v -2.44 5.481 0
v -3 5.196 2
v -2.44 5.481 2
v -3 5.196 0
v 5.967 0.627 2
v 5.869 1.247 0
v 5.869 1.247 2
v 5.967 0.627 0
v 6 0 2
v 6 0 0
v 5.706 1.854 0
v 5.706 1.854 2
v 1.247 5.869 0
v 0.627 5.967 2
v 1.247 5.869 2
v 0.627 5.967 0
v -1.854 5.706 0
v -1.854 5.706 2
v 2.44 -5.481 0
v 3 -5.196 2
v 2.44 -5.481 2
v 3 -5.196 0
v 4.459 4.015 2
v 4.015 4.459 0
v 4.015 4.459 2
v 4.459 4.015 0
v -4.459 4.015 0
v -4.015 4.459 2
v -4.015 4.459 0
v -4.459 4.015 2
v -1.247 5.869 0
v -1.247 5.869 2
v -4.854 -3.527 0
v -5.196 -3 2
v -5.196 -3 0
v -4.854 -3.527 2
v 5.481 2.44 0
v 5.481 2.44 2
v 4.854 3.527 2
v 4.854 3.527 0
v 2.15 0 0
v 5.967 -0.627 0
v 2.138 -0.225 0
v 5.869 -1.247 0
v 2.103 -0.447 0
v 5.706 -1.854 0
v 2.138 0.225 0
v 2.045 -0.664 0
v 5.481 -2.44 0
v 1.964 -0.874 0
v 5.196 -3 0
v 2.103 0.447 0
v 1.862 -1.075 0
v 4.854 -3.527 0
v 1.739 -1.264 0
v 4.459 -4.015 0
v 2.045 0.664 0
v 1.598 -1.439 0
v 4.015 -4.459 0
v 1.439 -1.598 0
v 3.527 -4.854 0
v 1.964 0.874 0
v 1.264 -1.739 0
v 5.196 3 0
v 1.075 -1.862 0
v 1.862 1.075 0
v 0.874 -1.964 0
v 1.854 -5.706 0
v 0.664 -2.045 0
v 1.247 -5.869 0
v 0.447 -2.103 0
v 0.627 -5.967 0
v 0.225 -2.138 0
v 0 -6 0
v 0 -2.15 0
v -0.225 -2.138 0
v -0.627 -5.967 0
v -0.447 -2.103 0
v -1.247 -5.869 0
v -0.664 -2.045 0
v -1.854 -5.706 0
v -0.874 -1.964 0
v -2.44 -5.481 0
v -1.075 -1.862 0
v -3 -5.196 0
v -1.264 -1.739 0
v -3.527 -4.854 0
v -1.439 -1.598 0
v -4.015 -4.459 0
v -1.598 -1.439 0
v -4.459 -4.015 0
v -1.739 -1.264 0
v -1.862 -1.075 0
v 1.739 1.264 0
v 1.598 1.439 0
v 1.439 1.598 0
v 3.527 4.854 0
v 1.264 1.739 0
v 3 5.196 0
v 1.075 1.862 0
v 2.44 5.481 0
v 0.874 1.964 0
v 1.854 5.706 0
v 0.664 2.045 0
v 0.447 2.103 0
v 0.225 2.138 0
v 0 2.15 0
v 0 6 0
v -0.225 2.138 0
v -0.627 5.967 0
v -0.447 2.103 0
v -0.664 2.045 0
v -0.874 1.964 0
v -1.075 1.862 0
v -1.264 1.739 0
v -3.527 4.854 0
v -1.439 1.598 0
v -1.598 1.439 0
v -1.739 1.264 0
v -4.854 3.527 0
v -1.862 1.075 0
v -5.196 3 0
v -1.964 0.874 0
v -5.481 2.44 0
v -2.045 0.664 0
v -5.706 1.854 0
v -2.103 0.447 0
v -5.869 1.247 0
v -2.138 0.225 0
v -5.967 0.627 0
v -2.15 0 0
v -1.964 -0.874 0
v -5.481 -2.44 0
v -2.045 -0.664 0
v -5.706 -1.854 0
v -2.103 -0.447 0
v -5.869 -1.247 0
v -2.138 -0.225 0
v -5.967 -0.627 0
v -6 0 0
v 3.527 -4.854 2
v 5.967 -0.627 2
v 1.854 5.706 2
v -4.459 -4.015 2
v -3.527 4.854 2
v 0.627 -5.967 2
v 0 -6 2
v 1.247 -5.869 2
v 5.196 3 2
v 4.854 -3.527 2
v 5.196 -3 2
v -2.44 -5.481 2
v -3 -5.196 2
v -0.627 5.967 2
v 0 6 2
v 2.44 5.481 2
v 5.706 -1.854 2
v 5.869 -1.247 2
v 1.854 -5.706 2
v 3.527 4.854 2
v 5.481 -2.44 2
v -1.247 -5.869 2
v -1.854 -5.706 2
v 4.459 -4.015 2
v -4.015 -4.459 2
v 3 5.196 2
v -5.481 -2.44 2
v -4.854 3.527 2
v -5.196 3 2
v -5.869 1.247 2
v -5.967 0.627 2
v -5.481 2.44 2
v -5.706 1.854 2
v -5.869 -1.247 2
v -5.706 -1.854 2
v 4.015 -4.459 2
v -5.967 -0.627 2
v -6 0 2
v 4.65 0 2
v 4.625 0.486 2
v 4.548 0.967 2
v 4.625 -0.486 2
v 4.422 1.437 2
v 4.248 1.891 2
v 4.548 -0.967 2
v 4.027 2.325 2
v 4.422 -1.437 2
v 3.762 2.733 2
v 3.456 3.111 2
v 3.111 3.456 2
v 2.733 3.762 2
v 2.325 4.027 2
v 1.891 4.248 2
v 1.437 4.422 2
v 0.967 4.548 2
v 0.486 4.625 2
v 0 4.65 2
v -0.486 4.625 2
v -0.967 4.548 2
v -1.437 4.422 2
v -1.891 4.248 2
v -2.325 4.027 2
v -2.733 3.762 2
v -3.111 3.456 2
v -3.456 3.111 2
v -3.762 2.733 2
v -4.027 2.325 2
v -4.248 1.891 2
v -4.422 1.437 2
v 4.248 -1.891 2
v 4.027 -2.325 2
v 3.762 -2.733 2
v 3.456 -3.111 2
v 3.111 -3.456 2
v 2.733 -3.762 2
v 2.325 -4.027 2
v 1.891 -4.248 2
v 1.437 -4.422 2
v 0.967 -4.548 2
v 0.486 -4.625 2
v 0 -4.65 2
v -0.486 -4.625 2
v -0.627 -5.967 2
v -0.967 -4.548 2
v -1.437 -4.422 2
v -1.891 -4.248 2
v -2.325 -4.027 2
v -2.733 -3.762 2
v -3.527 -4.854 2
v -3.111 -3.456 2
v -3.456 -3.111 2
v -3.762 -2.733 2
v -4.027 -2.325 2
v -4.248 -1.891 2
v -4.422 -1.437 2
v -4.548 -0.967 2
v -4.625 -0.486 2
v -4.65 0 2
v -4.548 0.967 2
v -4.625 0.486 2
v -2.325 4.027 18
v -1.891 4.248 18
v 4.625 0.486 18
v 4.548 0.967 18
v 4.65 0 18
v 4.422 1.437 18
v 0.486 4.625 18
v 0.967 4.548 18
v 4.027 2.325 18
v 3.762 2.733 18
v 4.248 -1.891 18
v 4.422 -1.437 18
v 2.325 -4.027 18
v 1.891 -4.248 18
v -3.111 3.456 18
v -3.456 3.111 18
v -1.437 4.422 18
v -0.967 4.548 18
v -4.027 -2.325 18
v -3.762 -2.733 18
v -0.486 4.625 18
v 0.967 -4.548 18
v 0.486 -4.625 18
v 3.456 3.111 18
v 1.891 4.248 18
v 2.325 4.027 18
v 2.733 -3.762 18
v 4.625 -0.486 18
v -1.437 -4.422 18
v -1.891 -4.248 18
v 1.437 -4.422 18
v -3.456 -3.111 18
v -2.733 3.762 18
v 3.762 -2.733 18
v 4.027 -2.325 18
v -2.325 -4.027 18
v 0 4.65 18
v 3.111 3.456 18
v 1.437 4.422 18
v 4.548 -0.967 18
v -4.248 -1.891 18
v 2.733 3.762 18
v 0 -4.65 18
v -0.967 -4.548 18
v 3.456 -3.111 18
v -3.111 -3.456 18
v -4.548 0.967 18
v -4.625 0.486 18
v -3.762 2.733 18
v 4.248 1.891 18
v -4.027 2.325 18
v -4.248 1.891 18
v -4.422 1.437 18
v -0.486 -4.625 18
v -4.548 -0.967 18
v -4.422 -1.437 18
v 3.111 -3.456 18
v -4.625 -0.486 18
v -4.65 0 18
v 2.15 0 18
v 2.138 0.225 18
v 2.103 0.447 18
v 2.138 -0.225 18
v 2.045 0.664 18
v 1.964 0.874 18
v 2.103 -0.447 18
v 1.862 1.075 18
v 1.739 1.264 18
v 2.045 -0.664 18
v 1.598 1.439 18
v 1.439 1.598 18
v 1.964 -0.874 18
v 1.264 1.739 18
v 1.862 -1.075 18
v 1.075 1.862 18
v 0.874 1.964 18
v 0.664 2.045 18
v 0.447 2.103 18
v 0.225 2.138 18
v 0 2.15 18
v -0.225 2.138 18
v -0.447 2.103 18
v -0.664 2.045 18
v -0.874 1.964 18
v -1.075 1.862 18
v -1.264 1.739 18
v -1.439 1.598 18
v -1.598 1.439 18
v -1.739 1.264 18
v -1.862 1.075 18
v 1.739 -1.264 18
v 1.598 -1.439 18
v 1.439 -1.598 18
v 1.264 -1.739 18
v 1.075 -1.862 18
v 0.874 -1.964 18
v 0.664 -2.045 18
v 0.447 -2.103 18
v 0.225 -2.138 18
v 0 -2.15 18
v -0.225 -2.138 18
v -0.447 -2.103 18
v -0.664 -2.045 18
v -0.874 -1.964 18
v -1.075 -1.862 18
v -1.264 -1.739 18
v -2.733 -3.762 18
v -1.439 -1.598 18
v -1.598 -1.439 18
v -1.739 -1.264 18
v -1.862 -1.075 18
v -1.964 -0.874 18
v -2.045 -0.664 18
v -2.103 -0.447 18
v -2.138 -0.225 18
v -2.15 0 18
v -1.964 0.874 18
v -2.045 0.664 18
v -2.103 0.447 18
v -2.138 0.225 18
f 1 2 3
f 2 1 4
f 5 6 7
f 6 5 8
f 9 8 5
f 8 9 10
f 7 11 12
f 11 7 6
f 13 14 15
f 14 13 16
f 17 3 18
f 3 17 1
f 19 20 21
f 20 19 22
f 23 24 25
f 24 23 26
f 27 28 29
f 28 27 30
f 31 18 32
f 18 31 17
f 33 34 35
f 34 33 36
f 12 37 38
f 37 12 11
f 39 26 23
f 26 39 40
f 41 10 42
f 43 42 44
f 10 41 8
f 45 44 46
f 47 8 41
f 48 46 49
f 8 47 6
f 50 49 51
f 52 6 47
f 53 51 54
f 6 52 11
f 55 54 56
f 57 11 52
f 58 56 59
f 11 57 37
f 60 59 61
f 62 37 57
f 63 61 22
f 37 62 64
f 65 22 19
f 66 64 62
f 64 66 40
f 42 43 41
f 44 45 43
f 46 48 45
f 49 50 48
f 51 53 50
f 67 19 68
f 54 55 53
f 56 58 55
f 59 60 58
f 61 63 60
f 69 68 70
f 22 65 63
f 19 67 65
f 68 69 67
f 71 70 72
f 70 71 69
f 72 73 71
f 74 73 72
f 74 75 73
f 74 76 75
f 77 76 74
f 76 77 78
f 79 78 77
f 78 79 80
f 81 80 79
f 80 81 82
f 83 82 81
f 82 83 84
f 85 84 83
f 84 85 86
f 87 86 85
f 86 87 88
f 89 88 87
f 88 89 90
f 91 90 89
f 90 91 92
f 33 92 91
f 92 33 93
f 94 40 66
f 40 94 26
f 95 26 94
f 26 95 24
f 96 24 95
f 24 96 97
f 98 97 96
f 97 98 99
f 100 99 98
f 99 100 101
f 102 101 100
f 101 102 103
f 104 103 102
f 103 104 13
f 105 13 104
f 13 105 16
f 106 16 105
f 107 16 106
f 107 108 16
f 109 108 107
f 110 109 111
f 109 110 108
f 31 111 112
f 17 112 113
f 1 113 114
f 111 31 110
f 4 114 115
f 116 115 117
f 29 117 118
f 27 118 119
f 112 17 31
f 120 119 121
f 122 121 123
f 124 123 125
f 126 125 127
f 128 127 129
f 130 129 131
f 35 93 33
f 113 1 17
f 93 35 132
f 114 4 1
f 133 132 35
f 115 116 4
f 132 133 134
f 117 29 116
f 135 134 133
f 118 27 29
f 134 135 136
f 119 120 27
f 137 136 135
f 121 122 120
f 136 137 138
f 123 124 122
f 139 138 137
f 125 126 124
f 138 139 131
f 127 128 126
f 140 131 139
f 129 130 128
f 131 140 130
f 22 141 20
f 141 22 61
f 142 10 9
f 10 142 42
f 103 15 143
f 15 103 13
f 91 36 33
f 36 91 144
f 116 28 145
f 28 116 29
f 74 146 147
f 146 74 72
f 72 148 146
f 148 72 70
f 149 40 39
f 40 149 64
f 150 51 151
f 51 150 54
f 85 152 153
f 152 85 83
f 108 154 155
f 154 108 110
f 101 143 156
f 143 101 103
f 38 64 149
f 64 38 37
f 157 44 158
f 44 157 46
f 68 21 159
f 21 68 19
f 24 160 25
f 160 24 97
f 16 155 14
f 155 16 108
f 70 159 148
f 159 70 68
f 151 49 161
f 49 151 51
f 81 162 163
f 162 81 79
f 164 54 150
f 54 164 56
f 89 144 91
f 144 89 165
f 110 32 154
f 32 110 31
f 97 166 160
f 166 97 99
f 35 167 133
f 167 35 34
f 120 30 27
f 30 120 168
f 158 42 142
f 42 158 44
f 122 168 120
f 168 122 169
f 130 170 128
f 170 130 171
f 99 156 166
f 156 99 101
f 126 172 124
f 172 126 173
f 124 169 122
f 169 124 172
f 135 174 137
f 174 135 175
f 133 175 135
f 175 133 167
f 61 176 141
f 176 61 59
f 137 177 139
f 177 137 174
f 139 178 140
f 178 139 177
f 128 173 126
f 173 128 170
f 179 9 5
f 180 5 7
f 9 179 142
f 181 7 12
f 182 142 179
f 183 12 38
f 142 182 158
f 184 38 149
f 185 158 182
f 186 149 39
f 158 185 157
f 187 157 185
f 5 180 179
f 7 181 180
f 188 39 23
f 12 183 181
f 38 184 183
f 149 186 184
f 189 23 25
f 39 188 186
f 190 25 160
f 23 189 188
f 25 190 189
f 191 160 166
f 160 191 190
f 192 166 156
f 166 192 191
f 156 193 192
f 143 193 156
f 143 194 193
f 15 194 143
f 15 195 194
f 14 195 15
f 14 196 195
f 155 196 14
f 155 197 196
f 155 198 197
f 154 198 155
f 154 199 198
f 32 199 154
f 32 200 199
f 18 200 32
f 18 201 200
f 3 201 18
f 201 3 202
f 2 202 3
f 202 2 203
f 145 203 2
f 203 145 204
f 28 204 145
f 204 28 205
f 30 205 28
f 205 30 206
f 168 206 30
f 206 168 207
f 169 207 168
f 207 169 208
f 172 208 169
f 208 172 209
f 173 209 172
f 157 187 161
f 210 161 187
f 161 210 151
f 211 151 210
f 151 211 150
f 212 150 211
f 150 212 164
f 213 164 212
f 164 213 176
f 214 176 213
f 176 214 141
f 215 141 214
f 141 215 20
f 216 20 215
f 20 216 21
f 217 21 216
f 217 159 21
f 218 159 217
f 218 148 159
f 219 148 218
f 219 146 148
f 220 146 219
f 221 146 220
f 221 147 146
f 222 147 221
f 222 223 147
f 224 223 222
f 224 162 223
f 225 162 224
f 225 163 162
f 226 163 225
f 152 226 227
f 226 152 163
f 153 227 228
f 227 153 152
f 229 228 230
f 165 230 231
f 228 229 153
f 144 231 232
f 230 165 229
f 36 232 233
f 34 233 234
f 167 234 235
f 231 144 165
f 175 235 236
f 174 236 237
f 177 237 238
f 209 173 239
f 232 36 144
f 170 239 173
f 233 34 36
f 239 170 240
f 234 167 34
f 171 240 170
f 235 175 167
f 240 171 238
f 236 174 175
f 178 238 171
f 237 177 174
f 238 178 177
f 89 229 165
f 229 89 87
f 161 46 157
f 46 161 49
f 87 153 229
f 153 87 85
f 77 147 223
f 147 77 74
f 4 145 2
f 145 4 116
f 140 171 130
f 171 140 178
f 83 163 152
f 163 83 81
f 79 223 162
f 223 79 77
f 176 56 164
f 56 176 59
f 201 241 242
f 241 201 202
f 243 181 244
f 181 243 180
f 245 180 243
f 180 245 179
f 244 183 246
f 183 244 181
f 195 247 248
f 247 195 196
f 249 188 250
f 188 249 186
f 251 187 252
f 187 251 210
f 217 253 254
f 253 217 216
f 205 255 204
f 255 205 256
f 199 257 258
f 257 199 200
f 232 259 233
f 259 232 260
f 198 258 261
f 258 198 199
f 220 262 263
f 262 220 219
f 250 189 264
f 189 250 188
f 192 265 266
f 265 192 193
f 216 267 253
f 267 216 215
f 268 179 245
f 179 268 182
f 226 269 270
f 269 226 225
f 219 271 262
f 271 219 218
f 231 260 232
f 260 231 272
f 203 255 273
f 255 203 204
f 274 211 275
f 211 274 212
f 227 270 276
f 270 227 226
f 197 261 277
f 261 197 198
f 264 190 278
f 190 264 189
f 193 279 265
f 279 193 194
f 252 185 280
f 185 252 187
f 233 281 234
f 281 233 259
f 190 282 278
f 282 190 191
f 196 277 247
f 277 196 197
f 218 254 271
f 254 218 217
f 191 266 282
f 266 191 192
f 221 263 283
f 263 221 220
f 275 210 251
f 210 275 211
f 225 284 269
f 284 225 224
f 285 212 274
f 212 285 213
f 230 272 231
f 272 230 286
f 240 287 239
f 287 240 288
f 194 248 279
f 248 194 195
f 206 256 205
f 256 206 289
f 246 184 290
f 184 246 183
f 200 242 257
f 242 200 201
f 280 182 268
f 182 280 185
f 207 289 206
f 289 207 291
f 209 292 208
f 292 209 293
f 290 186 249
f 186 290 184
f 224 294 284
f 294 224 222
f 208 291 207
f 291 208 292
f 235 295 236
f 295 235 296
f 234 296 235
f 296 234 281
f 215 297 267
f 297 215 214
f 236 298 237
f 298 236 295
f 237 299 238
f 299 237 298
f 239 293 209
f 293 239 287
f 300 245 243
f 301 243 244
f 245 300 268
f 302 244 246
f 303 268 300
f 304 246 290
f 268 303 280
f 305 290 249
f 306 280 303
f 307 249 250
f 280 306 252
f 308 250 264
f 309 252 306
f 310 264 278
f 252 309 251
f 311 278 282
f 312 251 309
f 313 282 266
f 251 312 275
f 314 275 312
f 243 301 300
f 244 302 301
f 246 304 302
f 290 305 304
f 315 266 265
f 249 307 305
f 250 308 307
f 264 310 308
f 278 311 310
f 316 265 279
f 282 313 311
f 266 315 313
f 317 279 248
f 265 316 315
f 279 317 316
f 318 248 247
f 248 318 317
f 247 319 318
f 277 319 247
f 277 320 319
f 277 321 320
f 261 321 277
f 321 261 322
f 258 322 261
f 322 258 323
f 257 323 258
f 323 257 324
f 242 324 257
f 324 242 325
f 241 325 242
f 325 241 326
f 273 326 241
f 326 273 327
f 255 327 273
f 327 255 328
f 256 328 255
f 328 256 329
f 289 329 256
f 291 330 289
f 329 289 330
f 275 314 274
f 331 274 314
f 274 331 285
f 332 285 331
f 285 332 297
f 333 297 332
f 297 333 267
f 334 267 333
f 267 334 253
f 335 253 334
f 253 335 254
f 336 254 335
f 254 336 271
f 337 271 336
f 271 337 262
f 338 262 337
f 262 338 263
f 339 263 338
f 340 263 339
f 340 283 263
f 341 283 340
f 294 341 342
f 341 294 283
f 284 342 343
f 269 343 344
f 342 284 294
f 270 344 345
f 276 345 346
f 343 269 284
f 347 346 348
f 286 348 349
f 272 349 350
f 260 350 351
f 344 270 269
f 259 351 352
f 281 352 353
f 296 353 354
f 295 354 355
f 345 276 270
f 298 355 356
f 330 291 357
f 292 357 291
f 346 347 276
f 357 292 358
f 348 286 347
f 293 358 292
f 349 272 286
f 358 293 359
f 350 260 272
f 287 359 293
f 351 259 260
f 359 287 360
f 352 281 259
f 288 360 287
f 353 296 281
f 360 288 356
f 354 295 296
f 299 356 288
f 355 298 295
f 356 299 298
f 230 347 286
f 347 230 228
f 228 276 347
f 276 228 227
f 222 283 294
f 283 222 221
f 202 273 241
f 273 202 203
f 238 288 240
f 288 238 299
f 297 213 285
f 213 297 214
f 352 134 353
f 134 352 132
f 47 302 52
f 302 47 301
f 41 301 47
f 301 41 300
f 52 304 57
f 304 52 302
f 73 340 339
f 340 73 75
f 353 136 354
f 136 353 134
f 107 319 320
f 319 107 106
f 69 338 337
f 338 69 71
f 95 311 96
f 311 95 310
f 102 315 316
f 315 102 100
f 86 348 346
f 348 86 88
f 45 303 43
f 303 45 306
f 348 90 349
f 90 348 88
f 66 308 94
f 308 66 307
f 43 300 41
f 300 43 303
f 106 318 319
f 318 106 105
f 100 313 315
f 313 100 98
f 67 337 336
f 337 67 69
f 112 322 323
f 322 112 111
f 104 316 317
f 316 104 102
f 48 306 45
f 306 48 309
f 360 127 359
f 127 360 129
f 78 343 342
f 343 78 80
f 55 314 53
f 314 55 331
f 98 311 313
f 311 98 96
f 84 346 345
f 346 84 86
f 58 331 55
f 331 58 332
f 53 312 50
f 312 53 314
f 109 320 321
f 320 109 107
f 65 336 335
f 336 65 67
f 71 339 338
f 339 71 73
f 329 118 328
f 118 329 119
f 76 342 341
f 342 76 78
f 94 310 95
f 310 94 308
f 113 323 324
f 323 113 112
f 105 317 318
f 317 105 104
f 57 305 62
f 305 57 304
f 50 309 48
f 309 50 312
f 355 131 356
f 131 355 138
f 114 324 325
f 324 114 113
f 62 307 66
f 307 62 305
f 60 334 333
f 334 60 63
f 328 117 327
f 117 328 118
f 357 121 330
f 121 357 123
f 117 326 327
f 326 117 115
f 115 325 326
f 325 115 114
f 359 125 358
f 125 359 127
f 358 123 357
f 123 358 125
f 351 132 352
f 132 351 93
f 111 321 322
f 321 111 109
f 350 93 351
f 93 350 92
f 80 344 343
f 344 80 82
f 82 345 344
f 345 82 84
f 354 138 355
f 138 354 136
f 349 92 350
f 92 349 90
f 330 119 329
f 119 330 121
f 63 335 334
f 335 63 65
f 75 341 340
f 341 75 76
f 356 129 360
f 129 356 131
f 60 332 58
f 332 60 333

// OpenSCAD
// PCB standoff with mounting base.
$fn = 60;
eps = 0.02;
thread_d = 4.3;
base_d = 12;
height = 18;
body_d = thread_d+5;
difference() {
    union() { cylinder(d=base_d,h=2); cylinder(d=body_d,h=height); }
    translate([0,0,-eps]) cylinder(d=thread_d,h=height+2*eps);
}
